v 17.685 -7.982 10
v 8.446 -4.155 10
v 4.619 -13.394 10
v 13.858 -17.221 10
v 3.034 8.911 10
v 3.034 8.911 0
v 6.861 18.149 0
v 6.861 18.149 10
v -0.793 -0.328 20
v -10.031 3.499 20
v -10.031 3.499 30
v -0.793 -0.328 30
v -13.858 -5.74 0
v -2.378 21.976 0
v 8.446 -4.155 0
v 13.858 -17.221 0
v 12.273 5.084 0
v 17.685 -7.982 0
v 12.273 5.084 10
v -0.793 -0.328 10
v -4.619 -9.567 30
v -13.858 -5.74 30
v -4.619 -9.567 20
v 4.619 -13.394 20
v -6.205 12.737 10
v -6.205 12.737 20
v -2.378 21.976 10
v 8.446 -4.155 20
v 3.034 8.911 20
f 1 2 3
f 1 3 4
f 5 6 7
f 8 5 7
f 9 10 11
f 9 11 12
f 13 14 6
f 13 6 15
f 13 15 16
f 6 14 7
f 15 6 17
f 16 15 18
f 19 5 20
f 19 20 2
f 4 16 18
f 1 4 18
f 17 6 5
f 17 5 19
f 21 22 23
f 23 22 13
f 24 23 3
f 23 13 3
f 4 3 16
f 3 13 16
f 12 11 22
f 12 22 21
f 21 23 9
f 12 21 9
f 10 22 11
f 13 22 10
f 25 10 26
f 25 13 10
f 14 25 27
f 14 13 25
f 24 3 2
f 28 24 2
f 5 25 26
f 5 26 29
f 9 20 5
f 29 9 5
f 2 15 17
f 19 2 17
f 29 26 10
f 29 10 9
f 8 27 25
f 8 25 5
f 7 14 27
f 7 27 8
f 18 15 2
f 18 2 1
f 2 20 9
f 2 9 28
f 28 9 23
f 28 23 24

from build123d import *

# Parameters (mm, degrees)
BOX001_W                  = 20
BOX001_H                  = 10
BOX001_DEPTH              = 20
BOX002_W                  = 10
BOX002_H                  = 20
BOX002_DEPTH              = 10
BOX003_W                  = 10
BOX003_H                  = 10
BOX003_DEPTH              = 10
BOX004_W                  = 30
BOX004_H                  = 10
BOX004_DEPTH              = 10
BOX005_W                  = 10
BOX005_H                  = 20
BOX005_DEPTH              = 20
BOX006_W                  = 10
BOX006_H                  = 30
BOX006_DEPTH              = 10
BOX007_W                  = 10
BOX007_H                  = 10
BOX007_DEPTH              = 10
BOX_W                     = 10
BOX_H                     = 10
BOX_DEPTH                 = 30
FUSION001_PLACEMENT_ANGLE = 337.5


with BuildPart() as cub001:
    # Box001 → Box001 (new body)
    with BuildSketch(Plane.XY):
        with Locations((10, 5)):
            Rectangle(BOX001_W, BOX001_H)
    extrude(amount=BOX001_DEPTH)


with BuildPart() as cub002:
    # Box002 → Box002 (new body)
    with BuildSketch(Plane.XY):
        with Locations((5, 10)):
            Rectangle(BOX002_W, BOX002_H)
    extrude(amount=BOX002_DEPTH)


with BuildPart() as cub003:
    # Box003 → Box003 (new body)
    with BuildSketch(Plane.XY):
        with Locations((5, 5)):
            Rectangle(BOX003_W, BOX003_H)
    extrude(amount=BOX003_DEPTH)


with BuildPart() as cub004:
    # Box004 → Box004 (new body)
    with BuildSketch(Plane.XY):
        with Locations((15, 5)):
            Rectangle(BOX004_W, BOX004_H)
    extrude(amount=BOX004_DEPTH)


with BuildPart() as cub005:
    # Box005 → Box005 (new body)
    with BuildSketch(Plane.XY):
        with Locations((5, 10)):
            Rectangle(BOX005_W, BOX005_H)
    extrude(amount=BOX005_DEPTH)


with BuildPart() as cub006:
    # Box006 → Box006 (new body)
    with BuildSketch(Plane.XY):
        with Locations((5, 15)):
            Rectangle(BOX006_W, BOX006_H)
    extrude(amount=BOX006_DEPTH)


with BuildPart() as cub007:
    # Box007 → Box007 (new body)
    with BuildSketch(Plane(origin=(10, 10, 0), x_dir=(1, 0, 0), z_dir=(0, 0, 1))):
        with Locations((5, 5)):
            Rectangle(BOX007_W, BOX007_H)
    extrude(amount=BOX007_DEPTH)


with BuildPart() as fusion001:
    # Box → Box (new body)
    with BuildSketch(Plane.XY):
        with Locations((5, 5)):
            Rectangle(BOX_W, BOX_H)
    extrude(amount=BOX_DEPTH)

    # Fusion: union Cub001, Cub002, Cub003, Cub004, Cub005, Cub006, Cub007
    add(cub001.part)
    add(cub002.part)
    add(cub003.part)
    add(cub004.part)
    add(cub005.part)
    add(cub006.part)
    add(cub007.part)


with BuildPart() as fusion001_1:
    # Fusion001 placement: moved
    add(fusion001.part.moved(Location((-13.858193, -5.740251, 0))).rotate(Axis((-13.858193, -5.740251, 0), (0, 0, 1)), FUSION001_PLACEMENT_ANGLE))


solid = fusion001_1.part
